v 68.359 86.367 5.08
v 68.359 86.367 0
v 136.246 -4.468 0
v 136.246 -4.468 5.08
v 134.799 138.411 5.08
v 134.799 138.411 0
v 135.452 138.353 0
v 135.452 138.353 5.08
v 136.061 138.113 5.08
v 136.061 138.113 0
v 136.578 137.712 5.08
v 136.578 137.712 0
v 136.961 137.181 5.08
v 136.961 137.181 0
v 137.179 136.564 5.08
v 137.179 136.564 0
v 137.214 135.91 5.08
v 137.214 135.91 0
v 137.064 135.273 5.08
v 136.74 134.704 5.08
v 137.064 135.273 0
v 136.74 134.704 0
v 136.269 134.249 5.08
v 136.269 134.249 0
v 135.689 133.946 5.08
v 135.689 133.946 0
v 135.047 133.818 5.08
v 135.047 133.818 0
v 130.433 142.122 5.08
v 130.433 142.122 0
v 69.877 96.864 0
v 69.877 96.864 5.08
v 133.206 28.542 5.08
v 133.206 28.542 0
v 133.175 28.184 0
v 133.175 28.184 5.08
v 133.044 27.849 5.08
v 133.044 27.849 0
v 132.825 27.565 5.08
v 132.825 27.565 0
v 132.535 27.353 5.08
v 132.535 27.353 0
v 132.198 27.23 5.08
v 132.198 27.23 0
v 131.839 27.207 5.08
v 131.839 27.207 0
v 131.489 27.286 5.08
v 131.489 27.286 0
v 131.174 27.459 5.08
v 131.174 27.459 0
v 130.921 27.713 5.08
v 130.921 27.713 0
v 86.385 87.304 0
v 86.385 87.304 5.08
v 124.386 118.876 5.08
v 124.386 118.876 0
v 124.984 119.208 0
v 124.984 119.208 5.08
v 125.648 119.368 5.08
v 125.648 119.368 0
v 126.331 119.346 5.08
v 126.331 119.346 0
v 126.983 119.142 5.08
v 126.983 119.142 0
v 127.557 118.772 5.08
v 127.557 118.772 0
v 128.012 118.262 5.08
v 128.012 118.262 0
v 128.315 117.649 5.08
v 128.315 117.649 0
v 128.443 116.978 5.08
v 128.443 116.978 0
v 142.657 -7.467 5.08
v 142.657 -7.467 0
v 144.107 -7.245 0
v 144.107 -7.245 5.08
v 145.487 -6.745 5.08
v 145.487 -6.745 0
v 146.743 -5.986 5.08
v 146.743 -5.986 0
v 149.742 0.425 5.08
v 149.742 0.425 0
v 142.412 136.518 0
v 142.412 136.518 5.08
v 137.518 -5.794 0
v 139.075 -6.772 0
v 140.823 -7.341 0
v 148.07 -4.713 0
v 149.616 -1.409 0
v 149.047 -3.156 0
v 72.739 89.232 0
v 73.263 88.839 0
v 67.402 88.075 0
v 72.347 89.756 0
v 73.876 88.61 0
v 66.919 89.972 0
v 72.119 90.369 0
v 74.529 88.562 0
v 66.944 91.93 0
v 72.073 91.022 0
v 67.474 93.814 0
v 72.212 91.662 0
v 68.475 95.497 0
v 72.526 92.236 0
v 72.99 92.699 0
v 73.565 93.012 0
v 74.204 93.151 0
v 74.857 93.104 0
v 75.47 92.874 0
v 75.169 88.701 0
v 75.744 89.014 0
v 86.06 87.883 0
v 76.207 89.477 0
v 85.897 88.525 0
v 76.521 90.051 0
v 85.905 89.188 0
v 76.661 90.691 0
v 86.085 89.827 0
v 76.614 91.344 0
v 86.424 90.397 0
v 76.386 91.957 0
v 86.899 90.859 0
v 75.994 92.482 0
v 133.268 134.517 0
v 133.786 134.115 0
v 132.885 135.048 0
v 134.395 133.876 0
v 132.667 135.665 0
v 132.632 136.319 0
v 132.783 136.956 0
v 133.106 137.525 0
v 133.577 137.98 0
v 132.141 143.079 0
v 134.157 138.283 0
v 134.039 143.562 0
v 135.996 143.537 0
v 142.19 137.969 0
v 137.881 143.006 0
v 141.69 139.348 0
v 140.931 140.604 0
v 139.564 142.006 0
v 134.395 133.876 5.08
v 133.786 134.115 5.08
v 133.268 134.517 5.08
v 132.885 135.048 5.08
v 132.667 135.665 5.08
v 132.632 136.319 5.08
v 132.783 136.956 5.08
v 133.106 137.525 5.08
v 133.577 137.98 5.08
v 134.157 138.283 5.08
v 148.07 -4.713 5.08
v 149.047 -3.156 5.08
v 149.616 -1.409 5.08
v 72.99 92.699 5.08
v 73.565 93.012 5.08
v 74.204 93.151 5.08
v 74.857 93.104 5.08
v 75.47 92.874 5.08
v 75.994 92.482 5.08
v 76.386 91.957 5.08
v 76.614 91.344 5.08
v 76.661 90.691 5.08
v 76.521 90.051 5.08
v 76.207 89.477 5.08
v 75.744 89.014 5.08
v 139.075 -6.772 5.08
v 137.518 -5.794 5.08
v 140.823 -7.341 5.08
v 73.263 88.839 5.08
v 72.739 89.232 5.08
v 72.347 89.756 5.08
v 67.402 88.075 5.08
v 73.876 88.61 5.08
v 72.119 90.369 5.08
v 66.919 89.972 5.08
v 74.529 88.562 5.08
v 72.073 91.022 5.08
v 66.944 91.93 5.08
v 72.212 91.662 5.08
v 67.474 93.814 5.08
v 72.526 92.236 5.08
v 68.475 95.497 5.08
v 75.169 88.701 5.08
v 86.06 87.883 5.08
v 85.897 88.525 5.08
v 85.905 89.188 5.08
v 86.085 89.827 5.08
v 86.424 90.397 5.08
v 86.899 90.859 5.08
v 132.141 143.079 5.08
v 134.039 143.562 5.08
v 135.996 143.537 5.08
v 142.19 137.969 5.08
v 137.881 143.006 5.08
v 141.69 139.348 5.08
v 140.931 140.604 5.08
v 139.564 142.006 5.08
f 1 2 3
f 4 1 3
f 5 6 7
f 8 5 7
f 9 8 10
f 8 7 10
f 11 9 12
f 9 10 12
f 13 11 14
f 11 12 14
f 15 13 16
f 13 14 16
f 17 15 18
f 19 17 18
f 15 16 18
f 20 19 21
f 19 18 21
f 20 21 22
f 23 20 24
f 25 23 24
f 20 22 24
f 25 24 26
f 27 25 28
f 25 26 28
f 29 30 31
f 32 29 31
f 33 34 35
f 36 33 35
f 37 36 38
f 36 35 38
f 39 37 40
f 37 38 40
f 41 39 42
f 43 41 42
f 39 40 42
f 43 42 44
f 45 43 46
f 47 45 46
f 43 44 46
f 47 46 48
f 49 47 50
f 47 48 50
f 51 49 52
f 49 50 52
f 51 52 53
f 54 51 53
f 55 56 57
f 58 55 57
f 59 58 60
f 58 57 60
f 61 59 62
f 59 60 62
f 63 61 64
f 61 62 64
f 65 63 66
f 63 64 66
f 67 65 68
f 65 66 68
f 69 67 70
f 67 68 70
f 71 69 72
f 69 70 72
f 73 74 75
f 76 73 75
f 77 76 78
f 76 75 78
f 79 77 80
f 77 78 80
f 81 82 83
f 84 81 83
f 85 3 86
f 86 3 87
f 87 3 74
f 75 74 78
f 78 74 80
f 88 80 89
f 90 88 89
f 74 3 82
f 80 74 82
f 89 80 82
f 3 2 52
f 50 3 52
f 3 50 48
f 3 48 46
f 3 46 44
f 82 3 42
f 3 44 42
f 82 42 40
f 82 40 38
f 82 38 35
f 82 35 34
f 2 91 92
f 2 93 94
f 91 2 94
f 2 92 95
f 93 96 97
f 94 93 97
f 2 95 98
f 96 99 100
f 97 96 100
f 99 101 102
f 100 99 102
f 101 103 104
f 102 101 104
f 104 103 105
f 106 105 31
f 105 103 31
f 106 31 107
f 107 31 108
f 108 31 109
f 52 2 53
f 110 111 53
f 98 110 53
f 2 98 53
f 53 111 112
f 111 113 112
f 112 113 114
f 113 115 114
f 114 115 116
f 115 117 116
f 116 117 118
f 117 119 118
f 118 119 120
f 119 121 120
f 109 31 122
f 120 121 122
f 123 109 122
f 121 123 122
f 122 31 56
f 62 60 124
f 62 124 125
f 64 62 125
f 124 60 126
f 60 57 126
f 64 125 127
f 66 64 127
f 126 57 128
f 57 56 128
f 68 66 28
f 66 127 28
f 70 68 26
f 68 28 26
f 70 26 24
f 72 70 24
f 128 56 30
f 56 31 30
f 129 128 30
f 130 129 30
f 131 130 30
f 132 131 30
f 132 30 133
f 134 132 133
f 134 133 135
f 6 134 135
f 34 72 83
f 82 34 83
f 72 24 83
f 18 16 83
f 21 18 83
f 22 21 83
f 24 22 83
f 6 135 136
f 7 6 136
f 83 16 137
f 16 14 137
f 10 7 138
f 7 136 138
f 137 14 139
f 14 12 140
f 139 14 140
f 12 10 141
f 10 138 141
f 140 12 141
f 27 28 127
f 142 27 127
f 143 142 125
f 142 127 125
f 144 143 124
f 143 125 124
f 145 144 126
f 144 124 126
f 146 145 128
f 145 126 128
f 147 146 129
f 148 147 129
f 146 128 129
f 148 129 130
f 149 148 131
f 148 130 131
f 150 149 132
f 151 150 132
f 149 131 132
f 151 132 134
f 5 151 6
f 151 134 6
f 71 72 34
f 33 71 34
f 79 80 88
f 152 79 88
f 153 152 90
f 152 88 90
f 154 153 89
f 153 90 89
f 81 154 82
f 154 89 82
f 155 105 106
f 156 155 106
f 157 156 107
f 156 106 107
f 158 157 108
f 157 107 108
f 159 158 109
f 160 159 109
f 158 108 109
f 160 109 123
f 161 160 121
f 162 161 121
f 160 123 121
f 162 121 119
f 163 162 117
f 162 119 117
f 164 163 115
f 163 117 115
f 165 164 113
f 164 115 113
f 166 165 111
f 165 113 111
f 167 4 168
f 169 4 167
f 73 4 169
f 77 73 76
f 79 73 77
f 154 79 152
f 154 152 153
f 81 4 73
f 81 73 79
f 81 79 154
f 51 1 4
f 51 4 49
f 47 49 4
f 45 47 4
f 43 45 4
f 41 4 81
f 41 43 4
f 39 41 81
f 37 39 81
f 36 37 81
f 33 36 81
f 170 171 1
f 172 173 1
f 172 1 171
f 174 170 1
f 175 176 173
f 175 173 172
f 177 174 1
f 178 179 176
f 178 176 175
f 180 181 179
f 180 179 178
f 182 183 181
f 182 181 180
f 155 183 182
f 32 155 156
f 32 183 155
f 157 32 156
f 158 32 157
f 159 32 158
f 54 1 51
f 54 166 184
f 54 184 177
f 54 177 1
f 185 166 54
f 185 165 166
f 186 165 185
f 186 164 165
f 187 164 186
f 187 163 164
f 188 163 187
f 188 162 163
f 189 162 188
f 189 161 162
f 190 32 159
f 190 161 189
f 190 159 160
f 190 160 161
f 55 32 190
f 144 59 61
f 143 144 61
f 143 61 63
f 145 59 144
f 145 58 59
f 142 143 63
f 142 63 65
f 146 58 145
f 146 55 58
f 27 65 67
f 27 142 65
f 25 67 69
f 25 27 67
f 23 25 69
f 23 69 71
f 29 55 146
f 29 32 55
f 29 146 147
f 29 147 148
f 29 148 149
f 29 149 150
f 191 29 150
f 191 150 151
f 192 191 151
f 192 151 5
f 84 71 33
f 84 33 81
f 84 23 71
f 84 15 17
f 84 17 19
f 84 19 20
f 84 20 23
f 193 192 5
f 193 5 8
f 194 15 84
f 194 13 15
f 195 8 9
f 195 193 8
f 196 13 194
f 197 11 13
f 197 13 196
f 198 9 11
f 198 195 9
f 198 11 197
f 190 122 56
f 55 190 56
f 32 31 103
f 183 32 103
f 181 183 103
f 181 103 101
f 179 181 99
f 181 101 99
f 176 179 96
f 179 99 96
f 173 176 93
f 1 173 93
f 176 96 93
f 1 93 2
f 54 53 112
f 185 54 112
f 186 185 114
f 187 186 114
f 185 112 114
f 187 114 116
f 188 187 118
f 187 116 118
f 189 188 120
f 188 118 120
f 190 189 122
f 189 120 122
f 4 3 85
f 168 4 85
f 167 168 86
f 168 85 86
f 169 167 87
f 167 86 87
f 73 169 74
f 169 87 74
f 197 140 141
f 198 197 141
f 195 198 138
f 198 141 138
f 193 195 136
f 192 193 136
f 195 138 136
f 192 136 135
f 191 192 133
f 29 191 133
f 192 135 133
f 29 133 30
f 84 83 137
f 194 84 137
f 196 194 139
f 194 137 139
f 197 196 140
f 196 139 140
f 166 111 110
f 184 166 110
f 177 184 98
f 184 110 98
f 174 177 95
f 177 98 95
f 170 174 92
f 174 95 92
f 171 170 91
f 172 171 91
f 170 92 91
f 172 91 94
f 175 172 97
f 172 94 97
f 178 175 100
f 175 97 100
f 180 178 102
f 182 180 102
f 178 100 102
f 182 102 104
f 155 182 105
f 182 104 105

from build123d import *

# Parameters (mm, degrees)
BOSS_EXTRUDE1_DEPTH = 5.08


with BuildPart() as part:
    # Sketch1 → Boss-Extrude1 (new body)
    with BuildSketch(Plane.XY):
        with BuildLine():
            Line((149.742446498, 0.425166718), (142.412299482, 136.517741625))
            ThreePointArc((142.412299482, 136.517741625), (141.974063379, 138.670668966), (140.930746882, 140.604224682))
            ThreePointArc((140.930746882, 140.604224682), (135.996353851, 143.53718437), (130.433295393, 142.121957281))
            Line((130.433295393, 142.121957281), (69.876767595, 96.864174071))
            ThreePointArc((69.876767595, 96.864174071), (66.943807907, 91.92978104), (68.359034997, 86.366722582))
            Line((68.359034997, 86.366722582), (136.245709811, -4.468069115))
            ThreePointArc((136.245709811, -4.468069115), (139.075136314, -6.771534614), (142.656678242, -7.467354313))
            ThreePointArc((142.656678242, -7.467354313), (144.809605584, -7.02911821), (146.7431613, -5.985801713))
            ThreePointArc((146.7431613, -5.985801713), (149.046626799, -3.15637521), (149.742446498, 0.425166718))
        make_face()
        with BuildLine():
            ThreePointArc((72.989736811, 92.698910254), (76.208955267, 92.233472258), (75.74351727, 89.014253801))
            ThreePointArc((75.74351727, 89.014253801), (72.524298814, 89.479691798), (72.989736811, 92.698910254))
        make_face(mode=Mode.SUBTRACT)
        with BuildLine():
            Line((128.442984245, 116.978229985), (133.206299189, 28.541832403))
            ThreePointArc((133.206299189, 28.541832403), (132.371004795, 27.279573488), (130.920851777, 27.713244469))
            Line((130.920851777, 27.713244469), (86.384644261, 87.304278258))
            ThreePointArc((86.384644261, 87.304278258), (85.90535402, 89.188300722), (86.898649701, 90.859415162))
            Line((86.898649701, 90.859415162), (124.386094861, 118.87619102))
            ThreePointArc((124.386094861, 118.87619102), (126.982999322, 119.142292563), (128.442984245, 116.978229985))
        make_face(mode=Mode.SUBTRACT)
        with BuildLine():
            ThreePointArc((135.046856931, 133.817694213), (132.626483815, 135.990663145), (134.799452746, 138.411036261))
            ThreePointArc((134.799452746, 138.411036261), (137.219825863, 136.238067329), (135.046856931, 133.817694213))
        make_face(mode=Mode.SUBTRACT)
    extrude(amount=BOSS_EXTRUDE1_DEPTH)


solid = part.part
